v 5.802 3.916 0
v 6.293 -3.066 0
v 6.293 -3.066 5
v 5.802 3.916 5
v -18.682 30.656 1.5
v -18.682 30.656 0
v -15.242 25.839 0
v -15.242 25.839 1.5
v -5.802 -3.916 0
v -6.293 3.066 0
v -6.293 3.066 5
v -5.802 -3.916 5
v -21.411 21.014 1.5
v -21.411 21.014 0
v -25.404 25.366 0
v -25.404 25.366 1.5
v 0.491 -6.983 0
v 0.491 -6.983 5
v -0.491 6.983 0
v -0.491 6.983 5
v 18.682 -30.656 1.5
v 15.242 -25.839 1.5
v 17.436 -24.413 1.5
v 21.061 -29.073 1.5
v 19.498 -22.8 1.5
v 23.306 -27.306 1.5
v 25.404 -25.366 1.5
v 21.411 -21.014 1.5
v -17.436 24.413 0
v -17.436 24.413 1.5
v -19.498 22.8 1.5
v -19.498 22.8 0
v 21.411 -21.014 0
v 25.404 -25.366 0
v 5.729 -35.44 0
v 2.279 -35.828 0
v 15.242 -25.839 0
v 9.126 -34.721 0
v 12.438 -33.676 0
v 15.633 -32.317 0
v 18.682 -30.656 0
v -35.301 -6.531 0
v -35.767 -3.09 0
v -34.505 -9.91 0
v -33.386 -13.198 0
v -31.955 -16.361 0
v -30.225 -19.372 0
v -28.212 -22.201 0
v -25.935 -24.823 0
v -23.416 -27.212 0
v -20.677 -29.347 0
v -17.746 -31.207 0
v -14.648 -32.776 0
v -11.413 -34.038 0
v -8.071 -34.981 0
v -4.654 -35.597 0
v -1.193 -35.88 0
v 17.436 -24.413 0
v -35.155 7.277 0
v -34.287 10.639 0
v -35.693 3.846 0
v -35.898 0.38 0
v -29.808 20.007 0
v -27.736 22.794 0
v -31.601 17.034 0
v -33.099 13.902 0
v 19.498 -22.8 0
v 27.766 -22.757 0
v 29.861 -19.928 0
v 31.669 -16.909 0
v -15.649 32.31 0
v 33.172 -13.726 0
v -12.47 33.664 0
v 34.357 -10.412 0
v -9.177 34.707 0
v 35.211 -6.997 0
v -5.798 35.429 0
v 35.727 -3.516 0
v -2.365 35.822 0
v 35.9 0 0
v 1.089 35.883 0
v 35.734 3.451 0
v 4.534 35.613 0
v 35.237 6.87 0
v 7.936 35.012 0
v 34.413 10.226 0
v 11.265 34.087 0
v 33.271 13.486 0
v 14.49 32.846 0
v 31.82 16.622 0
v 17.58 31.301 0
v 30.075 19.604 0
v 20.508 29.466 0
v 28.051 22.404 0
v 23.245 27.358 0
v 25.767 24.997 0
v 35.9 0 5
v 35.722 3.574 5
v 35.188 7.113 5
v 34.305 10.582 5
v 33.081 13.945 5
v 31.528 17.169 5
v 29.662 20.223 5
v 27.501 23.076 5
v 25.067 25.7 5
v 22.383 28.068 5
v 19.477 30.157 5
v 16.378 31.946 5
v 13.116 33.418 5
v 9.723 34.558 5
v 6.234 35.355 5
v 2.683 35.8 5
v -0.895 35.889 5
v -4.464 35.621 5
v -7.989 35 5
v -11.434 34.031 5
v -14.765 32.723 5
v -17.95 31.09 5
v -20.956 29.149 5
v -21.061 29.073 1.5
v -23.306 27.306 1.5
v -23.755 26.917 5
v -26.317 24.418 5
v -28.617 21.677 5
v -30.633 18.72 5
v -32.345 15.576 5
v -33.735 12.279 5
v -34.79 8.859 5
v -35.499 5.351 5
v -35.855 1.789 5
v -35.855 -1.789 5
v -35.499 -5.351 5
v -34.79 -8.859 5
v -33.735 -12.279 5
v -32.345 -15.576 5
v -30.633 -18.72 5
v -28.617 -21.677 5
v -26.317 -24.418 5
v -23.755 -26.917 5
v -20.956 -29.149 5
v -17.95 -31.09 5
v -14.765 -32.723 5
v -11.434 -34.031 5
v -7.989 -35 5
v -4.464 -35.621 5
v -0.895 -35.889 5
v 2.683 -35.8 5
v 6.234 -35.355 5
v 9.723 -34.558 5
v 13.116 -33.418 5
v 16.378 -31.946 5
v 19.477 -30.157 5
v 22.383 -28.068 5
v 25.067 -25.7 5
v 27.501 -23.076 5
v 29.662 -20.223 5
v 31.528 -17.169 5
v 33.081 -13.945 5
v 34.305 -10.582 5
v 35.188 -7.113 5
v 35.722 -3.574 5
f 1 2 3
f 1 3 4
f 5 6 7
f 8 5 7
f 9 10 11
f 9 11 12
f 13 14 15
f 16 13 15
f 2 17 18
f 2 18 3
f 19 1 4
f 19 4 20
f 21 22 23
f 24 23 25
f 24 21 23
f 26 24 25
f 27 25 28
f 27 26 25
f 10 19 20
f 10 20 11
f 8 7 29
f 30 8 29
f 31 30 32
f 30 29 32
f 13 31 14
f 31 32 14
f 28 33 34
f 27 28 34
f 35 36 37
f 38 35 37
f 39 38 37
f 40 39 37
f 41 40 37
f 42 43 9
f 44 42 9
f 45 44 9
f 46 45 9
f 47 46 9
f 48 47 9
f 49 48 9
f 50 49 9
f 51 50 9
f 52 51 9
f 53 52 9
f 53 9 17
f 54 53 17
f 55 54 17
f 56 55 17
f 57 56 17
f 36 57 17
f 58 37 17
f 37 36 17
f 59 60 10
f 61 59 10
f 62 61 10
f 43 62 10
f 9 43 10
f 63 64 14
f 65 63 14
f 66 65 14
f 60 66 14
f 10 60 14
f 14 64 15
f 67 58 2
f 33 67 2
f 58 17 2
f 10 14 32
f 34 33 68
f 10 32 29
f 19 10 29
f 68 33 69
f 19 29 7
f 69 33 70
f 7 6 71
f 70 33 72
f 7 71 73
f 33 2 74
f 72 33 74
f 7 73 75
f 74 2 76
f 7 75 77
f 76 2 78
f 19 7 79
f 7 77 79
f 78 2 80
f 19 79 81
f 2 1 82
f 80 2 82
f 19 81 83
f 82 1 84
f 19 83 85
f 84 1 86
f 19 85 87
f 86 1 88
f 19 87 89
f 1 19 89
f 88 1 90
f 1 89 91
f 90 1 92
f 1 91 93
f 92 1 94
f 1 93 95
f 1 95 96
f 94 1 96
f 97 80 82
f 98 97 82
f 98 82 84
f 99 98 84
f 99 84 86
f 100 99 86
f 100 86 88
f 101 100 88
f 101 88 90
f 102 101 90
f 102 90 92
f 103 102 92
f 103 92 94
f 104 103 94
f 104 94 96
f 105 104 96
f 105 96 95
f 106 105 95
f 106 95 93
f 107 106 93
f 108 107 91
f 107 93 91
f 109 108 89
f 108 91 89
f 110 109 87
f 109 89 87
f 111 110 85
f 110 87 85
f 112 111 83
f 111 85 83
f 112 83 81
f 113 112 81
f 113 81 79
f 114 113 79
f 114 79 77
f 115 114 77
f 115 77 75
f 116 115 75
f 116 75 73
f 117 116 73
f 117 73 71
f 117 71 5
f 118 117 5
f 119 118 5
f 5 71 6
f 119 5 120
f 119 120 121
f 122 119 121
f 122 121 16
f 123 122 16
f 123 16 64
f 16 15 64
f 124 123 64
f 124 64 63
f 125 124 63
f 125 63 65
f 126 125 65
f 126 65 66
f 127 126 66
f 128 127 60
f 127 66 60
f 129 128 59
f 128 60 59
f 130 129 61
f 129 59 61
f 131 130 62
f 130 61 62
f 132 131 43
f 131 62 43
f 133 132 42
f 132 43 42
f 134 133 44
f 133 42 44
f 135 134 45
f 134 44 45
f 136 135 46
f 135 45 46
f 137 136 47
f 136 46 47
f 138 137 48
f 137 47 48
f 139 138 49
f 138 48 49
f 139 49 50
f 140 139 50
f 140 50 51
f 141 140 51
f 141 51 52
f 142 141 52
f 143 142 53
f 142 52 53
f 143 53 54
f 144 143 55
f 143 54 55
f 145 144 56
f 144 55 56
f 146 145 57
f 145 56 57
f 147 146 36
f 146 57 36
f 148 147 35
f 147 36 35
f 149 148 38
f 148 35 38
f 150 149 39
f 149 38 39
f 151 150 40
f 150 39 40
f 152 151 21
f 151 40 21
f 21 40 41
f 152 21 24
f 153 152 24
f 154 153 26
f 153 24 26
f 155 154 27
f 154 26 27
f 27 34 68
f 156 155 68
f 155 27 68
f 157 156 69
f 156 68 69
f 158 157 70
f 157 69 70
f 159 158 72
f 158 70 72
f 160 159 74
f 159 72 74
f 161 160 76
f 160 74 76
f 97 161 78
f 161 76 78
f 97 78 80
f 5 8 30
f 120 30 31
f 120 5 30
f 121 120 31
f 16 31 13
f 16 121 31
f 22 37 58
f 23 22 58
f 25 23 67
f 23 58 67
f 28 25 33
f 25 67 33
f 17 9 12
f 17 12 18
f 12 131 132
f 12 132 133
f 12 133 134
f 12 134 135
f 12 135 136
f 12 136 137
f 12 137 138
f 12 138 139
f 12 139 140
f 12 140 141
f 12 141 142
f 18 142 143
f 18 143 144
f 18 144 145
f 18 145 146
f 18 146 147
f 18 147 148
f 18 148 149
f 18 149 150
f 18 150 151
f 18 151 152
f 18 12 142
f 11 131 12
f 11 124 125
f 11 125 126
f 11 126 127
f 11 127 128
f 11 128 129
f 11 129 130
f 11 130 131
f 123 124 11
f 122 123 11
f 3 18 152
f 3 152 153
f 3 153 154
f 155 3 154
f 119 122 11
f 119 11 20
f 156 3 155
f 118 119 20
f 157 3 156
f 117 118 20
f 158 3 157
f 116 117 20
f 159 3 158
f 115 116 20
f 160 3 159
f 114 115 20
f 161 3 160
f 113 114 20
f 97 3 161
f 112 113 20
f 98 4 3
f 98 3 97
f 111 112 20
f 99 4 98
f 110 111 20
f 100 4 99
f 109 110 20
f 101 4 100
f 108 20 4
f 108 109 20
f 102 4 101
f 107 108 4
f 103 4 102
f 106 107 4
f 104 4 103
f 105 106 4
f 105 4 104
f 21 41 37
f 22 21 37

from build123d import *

# Parameters (mm, degrees)
SKETCH_1_R               = 35.9
EXTRUDE_1_DEPTH          = 5
CUT_EXTRUDE_1_DEPTH      = 1.5
PATTERN_CIRCULAR_1_COUNT = 2


with BuildPart() as part:
    # 草图1 → 凸台-拉伸1 (new body)
    with BuildSketch(Plane.XY):
        Circle(SKETCH_1_R)
        Polygon((6.292659869, -3.066338496), (5.801856968, 3.916434056), (-0.490802901, 6.982772552), (-6.292659869, 3.066338496), (-5.801856968, -3.916434056), (0.490802901, -6.982772552), align=None, mode=Mode.SUBTRACT)
    extrude(amount=EXTRUDE_1_DEPTH)

    # 草图2 → 切除-拉伸1 (cut)
    with BuildSketch(Plane(origin=(0, 0, 0), x_dir=(-1, 0, 0), z_dir=(0, 0, -1))):
        with BuildLine():
            Line((18.682261423, 30.655882113), (15.242196262, 25.839416656))
            ThreePointArc((15.242196262, 25.839416656), (18.484517825, 23.628851025), (21.410564164, 21.013989202))
            Line((21.410564164, 21.013989202), (25.403819071, 25.366434054))
            ThreePointArc((25.403819071, 25.366434054), (22.201130343, 28.21205082), (18.682261423, 30.655882113))
        make_face()
    cut_extrude_1 = extrude(amount=-CUT_EXTRUDE_1_DEPTH, mode=Mode.SUBTRACT)

    # 阵列(圆周)1: 切除-拉伸1 ×2 about axis
    pattern_circular_1_axis = Axis((0, 0, 0), (0, 0, 1))
    for i in range(1, PATTERN_CIRCULAR_1_COUNT):
        add(cut_extrude_1.rotate(pattern_circular_1_axis, i * 360 / PATTERN_CIRCULAR_1_COUNT), mode=Mode.SUBTRACT)


solid = part.part
